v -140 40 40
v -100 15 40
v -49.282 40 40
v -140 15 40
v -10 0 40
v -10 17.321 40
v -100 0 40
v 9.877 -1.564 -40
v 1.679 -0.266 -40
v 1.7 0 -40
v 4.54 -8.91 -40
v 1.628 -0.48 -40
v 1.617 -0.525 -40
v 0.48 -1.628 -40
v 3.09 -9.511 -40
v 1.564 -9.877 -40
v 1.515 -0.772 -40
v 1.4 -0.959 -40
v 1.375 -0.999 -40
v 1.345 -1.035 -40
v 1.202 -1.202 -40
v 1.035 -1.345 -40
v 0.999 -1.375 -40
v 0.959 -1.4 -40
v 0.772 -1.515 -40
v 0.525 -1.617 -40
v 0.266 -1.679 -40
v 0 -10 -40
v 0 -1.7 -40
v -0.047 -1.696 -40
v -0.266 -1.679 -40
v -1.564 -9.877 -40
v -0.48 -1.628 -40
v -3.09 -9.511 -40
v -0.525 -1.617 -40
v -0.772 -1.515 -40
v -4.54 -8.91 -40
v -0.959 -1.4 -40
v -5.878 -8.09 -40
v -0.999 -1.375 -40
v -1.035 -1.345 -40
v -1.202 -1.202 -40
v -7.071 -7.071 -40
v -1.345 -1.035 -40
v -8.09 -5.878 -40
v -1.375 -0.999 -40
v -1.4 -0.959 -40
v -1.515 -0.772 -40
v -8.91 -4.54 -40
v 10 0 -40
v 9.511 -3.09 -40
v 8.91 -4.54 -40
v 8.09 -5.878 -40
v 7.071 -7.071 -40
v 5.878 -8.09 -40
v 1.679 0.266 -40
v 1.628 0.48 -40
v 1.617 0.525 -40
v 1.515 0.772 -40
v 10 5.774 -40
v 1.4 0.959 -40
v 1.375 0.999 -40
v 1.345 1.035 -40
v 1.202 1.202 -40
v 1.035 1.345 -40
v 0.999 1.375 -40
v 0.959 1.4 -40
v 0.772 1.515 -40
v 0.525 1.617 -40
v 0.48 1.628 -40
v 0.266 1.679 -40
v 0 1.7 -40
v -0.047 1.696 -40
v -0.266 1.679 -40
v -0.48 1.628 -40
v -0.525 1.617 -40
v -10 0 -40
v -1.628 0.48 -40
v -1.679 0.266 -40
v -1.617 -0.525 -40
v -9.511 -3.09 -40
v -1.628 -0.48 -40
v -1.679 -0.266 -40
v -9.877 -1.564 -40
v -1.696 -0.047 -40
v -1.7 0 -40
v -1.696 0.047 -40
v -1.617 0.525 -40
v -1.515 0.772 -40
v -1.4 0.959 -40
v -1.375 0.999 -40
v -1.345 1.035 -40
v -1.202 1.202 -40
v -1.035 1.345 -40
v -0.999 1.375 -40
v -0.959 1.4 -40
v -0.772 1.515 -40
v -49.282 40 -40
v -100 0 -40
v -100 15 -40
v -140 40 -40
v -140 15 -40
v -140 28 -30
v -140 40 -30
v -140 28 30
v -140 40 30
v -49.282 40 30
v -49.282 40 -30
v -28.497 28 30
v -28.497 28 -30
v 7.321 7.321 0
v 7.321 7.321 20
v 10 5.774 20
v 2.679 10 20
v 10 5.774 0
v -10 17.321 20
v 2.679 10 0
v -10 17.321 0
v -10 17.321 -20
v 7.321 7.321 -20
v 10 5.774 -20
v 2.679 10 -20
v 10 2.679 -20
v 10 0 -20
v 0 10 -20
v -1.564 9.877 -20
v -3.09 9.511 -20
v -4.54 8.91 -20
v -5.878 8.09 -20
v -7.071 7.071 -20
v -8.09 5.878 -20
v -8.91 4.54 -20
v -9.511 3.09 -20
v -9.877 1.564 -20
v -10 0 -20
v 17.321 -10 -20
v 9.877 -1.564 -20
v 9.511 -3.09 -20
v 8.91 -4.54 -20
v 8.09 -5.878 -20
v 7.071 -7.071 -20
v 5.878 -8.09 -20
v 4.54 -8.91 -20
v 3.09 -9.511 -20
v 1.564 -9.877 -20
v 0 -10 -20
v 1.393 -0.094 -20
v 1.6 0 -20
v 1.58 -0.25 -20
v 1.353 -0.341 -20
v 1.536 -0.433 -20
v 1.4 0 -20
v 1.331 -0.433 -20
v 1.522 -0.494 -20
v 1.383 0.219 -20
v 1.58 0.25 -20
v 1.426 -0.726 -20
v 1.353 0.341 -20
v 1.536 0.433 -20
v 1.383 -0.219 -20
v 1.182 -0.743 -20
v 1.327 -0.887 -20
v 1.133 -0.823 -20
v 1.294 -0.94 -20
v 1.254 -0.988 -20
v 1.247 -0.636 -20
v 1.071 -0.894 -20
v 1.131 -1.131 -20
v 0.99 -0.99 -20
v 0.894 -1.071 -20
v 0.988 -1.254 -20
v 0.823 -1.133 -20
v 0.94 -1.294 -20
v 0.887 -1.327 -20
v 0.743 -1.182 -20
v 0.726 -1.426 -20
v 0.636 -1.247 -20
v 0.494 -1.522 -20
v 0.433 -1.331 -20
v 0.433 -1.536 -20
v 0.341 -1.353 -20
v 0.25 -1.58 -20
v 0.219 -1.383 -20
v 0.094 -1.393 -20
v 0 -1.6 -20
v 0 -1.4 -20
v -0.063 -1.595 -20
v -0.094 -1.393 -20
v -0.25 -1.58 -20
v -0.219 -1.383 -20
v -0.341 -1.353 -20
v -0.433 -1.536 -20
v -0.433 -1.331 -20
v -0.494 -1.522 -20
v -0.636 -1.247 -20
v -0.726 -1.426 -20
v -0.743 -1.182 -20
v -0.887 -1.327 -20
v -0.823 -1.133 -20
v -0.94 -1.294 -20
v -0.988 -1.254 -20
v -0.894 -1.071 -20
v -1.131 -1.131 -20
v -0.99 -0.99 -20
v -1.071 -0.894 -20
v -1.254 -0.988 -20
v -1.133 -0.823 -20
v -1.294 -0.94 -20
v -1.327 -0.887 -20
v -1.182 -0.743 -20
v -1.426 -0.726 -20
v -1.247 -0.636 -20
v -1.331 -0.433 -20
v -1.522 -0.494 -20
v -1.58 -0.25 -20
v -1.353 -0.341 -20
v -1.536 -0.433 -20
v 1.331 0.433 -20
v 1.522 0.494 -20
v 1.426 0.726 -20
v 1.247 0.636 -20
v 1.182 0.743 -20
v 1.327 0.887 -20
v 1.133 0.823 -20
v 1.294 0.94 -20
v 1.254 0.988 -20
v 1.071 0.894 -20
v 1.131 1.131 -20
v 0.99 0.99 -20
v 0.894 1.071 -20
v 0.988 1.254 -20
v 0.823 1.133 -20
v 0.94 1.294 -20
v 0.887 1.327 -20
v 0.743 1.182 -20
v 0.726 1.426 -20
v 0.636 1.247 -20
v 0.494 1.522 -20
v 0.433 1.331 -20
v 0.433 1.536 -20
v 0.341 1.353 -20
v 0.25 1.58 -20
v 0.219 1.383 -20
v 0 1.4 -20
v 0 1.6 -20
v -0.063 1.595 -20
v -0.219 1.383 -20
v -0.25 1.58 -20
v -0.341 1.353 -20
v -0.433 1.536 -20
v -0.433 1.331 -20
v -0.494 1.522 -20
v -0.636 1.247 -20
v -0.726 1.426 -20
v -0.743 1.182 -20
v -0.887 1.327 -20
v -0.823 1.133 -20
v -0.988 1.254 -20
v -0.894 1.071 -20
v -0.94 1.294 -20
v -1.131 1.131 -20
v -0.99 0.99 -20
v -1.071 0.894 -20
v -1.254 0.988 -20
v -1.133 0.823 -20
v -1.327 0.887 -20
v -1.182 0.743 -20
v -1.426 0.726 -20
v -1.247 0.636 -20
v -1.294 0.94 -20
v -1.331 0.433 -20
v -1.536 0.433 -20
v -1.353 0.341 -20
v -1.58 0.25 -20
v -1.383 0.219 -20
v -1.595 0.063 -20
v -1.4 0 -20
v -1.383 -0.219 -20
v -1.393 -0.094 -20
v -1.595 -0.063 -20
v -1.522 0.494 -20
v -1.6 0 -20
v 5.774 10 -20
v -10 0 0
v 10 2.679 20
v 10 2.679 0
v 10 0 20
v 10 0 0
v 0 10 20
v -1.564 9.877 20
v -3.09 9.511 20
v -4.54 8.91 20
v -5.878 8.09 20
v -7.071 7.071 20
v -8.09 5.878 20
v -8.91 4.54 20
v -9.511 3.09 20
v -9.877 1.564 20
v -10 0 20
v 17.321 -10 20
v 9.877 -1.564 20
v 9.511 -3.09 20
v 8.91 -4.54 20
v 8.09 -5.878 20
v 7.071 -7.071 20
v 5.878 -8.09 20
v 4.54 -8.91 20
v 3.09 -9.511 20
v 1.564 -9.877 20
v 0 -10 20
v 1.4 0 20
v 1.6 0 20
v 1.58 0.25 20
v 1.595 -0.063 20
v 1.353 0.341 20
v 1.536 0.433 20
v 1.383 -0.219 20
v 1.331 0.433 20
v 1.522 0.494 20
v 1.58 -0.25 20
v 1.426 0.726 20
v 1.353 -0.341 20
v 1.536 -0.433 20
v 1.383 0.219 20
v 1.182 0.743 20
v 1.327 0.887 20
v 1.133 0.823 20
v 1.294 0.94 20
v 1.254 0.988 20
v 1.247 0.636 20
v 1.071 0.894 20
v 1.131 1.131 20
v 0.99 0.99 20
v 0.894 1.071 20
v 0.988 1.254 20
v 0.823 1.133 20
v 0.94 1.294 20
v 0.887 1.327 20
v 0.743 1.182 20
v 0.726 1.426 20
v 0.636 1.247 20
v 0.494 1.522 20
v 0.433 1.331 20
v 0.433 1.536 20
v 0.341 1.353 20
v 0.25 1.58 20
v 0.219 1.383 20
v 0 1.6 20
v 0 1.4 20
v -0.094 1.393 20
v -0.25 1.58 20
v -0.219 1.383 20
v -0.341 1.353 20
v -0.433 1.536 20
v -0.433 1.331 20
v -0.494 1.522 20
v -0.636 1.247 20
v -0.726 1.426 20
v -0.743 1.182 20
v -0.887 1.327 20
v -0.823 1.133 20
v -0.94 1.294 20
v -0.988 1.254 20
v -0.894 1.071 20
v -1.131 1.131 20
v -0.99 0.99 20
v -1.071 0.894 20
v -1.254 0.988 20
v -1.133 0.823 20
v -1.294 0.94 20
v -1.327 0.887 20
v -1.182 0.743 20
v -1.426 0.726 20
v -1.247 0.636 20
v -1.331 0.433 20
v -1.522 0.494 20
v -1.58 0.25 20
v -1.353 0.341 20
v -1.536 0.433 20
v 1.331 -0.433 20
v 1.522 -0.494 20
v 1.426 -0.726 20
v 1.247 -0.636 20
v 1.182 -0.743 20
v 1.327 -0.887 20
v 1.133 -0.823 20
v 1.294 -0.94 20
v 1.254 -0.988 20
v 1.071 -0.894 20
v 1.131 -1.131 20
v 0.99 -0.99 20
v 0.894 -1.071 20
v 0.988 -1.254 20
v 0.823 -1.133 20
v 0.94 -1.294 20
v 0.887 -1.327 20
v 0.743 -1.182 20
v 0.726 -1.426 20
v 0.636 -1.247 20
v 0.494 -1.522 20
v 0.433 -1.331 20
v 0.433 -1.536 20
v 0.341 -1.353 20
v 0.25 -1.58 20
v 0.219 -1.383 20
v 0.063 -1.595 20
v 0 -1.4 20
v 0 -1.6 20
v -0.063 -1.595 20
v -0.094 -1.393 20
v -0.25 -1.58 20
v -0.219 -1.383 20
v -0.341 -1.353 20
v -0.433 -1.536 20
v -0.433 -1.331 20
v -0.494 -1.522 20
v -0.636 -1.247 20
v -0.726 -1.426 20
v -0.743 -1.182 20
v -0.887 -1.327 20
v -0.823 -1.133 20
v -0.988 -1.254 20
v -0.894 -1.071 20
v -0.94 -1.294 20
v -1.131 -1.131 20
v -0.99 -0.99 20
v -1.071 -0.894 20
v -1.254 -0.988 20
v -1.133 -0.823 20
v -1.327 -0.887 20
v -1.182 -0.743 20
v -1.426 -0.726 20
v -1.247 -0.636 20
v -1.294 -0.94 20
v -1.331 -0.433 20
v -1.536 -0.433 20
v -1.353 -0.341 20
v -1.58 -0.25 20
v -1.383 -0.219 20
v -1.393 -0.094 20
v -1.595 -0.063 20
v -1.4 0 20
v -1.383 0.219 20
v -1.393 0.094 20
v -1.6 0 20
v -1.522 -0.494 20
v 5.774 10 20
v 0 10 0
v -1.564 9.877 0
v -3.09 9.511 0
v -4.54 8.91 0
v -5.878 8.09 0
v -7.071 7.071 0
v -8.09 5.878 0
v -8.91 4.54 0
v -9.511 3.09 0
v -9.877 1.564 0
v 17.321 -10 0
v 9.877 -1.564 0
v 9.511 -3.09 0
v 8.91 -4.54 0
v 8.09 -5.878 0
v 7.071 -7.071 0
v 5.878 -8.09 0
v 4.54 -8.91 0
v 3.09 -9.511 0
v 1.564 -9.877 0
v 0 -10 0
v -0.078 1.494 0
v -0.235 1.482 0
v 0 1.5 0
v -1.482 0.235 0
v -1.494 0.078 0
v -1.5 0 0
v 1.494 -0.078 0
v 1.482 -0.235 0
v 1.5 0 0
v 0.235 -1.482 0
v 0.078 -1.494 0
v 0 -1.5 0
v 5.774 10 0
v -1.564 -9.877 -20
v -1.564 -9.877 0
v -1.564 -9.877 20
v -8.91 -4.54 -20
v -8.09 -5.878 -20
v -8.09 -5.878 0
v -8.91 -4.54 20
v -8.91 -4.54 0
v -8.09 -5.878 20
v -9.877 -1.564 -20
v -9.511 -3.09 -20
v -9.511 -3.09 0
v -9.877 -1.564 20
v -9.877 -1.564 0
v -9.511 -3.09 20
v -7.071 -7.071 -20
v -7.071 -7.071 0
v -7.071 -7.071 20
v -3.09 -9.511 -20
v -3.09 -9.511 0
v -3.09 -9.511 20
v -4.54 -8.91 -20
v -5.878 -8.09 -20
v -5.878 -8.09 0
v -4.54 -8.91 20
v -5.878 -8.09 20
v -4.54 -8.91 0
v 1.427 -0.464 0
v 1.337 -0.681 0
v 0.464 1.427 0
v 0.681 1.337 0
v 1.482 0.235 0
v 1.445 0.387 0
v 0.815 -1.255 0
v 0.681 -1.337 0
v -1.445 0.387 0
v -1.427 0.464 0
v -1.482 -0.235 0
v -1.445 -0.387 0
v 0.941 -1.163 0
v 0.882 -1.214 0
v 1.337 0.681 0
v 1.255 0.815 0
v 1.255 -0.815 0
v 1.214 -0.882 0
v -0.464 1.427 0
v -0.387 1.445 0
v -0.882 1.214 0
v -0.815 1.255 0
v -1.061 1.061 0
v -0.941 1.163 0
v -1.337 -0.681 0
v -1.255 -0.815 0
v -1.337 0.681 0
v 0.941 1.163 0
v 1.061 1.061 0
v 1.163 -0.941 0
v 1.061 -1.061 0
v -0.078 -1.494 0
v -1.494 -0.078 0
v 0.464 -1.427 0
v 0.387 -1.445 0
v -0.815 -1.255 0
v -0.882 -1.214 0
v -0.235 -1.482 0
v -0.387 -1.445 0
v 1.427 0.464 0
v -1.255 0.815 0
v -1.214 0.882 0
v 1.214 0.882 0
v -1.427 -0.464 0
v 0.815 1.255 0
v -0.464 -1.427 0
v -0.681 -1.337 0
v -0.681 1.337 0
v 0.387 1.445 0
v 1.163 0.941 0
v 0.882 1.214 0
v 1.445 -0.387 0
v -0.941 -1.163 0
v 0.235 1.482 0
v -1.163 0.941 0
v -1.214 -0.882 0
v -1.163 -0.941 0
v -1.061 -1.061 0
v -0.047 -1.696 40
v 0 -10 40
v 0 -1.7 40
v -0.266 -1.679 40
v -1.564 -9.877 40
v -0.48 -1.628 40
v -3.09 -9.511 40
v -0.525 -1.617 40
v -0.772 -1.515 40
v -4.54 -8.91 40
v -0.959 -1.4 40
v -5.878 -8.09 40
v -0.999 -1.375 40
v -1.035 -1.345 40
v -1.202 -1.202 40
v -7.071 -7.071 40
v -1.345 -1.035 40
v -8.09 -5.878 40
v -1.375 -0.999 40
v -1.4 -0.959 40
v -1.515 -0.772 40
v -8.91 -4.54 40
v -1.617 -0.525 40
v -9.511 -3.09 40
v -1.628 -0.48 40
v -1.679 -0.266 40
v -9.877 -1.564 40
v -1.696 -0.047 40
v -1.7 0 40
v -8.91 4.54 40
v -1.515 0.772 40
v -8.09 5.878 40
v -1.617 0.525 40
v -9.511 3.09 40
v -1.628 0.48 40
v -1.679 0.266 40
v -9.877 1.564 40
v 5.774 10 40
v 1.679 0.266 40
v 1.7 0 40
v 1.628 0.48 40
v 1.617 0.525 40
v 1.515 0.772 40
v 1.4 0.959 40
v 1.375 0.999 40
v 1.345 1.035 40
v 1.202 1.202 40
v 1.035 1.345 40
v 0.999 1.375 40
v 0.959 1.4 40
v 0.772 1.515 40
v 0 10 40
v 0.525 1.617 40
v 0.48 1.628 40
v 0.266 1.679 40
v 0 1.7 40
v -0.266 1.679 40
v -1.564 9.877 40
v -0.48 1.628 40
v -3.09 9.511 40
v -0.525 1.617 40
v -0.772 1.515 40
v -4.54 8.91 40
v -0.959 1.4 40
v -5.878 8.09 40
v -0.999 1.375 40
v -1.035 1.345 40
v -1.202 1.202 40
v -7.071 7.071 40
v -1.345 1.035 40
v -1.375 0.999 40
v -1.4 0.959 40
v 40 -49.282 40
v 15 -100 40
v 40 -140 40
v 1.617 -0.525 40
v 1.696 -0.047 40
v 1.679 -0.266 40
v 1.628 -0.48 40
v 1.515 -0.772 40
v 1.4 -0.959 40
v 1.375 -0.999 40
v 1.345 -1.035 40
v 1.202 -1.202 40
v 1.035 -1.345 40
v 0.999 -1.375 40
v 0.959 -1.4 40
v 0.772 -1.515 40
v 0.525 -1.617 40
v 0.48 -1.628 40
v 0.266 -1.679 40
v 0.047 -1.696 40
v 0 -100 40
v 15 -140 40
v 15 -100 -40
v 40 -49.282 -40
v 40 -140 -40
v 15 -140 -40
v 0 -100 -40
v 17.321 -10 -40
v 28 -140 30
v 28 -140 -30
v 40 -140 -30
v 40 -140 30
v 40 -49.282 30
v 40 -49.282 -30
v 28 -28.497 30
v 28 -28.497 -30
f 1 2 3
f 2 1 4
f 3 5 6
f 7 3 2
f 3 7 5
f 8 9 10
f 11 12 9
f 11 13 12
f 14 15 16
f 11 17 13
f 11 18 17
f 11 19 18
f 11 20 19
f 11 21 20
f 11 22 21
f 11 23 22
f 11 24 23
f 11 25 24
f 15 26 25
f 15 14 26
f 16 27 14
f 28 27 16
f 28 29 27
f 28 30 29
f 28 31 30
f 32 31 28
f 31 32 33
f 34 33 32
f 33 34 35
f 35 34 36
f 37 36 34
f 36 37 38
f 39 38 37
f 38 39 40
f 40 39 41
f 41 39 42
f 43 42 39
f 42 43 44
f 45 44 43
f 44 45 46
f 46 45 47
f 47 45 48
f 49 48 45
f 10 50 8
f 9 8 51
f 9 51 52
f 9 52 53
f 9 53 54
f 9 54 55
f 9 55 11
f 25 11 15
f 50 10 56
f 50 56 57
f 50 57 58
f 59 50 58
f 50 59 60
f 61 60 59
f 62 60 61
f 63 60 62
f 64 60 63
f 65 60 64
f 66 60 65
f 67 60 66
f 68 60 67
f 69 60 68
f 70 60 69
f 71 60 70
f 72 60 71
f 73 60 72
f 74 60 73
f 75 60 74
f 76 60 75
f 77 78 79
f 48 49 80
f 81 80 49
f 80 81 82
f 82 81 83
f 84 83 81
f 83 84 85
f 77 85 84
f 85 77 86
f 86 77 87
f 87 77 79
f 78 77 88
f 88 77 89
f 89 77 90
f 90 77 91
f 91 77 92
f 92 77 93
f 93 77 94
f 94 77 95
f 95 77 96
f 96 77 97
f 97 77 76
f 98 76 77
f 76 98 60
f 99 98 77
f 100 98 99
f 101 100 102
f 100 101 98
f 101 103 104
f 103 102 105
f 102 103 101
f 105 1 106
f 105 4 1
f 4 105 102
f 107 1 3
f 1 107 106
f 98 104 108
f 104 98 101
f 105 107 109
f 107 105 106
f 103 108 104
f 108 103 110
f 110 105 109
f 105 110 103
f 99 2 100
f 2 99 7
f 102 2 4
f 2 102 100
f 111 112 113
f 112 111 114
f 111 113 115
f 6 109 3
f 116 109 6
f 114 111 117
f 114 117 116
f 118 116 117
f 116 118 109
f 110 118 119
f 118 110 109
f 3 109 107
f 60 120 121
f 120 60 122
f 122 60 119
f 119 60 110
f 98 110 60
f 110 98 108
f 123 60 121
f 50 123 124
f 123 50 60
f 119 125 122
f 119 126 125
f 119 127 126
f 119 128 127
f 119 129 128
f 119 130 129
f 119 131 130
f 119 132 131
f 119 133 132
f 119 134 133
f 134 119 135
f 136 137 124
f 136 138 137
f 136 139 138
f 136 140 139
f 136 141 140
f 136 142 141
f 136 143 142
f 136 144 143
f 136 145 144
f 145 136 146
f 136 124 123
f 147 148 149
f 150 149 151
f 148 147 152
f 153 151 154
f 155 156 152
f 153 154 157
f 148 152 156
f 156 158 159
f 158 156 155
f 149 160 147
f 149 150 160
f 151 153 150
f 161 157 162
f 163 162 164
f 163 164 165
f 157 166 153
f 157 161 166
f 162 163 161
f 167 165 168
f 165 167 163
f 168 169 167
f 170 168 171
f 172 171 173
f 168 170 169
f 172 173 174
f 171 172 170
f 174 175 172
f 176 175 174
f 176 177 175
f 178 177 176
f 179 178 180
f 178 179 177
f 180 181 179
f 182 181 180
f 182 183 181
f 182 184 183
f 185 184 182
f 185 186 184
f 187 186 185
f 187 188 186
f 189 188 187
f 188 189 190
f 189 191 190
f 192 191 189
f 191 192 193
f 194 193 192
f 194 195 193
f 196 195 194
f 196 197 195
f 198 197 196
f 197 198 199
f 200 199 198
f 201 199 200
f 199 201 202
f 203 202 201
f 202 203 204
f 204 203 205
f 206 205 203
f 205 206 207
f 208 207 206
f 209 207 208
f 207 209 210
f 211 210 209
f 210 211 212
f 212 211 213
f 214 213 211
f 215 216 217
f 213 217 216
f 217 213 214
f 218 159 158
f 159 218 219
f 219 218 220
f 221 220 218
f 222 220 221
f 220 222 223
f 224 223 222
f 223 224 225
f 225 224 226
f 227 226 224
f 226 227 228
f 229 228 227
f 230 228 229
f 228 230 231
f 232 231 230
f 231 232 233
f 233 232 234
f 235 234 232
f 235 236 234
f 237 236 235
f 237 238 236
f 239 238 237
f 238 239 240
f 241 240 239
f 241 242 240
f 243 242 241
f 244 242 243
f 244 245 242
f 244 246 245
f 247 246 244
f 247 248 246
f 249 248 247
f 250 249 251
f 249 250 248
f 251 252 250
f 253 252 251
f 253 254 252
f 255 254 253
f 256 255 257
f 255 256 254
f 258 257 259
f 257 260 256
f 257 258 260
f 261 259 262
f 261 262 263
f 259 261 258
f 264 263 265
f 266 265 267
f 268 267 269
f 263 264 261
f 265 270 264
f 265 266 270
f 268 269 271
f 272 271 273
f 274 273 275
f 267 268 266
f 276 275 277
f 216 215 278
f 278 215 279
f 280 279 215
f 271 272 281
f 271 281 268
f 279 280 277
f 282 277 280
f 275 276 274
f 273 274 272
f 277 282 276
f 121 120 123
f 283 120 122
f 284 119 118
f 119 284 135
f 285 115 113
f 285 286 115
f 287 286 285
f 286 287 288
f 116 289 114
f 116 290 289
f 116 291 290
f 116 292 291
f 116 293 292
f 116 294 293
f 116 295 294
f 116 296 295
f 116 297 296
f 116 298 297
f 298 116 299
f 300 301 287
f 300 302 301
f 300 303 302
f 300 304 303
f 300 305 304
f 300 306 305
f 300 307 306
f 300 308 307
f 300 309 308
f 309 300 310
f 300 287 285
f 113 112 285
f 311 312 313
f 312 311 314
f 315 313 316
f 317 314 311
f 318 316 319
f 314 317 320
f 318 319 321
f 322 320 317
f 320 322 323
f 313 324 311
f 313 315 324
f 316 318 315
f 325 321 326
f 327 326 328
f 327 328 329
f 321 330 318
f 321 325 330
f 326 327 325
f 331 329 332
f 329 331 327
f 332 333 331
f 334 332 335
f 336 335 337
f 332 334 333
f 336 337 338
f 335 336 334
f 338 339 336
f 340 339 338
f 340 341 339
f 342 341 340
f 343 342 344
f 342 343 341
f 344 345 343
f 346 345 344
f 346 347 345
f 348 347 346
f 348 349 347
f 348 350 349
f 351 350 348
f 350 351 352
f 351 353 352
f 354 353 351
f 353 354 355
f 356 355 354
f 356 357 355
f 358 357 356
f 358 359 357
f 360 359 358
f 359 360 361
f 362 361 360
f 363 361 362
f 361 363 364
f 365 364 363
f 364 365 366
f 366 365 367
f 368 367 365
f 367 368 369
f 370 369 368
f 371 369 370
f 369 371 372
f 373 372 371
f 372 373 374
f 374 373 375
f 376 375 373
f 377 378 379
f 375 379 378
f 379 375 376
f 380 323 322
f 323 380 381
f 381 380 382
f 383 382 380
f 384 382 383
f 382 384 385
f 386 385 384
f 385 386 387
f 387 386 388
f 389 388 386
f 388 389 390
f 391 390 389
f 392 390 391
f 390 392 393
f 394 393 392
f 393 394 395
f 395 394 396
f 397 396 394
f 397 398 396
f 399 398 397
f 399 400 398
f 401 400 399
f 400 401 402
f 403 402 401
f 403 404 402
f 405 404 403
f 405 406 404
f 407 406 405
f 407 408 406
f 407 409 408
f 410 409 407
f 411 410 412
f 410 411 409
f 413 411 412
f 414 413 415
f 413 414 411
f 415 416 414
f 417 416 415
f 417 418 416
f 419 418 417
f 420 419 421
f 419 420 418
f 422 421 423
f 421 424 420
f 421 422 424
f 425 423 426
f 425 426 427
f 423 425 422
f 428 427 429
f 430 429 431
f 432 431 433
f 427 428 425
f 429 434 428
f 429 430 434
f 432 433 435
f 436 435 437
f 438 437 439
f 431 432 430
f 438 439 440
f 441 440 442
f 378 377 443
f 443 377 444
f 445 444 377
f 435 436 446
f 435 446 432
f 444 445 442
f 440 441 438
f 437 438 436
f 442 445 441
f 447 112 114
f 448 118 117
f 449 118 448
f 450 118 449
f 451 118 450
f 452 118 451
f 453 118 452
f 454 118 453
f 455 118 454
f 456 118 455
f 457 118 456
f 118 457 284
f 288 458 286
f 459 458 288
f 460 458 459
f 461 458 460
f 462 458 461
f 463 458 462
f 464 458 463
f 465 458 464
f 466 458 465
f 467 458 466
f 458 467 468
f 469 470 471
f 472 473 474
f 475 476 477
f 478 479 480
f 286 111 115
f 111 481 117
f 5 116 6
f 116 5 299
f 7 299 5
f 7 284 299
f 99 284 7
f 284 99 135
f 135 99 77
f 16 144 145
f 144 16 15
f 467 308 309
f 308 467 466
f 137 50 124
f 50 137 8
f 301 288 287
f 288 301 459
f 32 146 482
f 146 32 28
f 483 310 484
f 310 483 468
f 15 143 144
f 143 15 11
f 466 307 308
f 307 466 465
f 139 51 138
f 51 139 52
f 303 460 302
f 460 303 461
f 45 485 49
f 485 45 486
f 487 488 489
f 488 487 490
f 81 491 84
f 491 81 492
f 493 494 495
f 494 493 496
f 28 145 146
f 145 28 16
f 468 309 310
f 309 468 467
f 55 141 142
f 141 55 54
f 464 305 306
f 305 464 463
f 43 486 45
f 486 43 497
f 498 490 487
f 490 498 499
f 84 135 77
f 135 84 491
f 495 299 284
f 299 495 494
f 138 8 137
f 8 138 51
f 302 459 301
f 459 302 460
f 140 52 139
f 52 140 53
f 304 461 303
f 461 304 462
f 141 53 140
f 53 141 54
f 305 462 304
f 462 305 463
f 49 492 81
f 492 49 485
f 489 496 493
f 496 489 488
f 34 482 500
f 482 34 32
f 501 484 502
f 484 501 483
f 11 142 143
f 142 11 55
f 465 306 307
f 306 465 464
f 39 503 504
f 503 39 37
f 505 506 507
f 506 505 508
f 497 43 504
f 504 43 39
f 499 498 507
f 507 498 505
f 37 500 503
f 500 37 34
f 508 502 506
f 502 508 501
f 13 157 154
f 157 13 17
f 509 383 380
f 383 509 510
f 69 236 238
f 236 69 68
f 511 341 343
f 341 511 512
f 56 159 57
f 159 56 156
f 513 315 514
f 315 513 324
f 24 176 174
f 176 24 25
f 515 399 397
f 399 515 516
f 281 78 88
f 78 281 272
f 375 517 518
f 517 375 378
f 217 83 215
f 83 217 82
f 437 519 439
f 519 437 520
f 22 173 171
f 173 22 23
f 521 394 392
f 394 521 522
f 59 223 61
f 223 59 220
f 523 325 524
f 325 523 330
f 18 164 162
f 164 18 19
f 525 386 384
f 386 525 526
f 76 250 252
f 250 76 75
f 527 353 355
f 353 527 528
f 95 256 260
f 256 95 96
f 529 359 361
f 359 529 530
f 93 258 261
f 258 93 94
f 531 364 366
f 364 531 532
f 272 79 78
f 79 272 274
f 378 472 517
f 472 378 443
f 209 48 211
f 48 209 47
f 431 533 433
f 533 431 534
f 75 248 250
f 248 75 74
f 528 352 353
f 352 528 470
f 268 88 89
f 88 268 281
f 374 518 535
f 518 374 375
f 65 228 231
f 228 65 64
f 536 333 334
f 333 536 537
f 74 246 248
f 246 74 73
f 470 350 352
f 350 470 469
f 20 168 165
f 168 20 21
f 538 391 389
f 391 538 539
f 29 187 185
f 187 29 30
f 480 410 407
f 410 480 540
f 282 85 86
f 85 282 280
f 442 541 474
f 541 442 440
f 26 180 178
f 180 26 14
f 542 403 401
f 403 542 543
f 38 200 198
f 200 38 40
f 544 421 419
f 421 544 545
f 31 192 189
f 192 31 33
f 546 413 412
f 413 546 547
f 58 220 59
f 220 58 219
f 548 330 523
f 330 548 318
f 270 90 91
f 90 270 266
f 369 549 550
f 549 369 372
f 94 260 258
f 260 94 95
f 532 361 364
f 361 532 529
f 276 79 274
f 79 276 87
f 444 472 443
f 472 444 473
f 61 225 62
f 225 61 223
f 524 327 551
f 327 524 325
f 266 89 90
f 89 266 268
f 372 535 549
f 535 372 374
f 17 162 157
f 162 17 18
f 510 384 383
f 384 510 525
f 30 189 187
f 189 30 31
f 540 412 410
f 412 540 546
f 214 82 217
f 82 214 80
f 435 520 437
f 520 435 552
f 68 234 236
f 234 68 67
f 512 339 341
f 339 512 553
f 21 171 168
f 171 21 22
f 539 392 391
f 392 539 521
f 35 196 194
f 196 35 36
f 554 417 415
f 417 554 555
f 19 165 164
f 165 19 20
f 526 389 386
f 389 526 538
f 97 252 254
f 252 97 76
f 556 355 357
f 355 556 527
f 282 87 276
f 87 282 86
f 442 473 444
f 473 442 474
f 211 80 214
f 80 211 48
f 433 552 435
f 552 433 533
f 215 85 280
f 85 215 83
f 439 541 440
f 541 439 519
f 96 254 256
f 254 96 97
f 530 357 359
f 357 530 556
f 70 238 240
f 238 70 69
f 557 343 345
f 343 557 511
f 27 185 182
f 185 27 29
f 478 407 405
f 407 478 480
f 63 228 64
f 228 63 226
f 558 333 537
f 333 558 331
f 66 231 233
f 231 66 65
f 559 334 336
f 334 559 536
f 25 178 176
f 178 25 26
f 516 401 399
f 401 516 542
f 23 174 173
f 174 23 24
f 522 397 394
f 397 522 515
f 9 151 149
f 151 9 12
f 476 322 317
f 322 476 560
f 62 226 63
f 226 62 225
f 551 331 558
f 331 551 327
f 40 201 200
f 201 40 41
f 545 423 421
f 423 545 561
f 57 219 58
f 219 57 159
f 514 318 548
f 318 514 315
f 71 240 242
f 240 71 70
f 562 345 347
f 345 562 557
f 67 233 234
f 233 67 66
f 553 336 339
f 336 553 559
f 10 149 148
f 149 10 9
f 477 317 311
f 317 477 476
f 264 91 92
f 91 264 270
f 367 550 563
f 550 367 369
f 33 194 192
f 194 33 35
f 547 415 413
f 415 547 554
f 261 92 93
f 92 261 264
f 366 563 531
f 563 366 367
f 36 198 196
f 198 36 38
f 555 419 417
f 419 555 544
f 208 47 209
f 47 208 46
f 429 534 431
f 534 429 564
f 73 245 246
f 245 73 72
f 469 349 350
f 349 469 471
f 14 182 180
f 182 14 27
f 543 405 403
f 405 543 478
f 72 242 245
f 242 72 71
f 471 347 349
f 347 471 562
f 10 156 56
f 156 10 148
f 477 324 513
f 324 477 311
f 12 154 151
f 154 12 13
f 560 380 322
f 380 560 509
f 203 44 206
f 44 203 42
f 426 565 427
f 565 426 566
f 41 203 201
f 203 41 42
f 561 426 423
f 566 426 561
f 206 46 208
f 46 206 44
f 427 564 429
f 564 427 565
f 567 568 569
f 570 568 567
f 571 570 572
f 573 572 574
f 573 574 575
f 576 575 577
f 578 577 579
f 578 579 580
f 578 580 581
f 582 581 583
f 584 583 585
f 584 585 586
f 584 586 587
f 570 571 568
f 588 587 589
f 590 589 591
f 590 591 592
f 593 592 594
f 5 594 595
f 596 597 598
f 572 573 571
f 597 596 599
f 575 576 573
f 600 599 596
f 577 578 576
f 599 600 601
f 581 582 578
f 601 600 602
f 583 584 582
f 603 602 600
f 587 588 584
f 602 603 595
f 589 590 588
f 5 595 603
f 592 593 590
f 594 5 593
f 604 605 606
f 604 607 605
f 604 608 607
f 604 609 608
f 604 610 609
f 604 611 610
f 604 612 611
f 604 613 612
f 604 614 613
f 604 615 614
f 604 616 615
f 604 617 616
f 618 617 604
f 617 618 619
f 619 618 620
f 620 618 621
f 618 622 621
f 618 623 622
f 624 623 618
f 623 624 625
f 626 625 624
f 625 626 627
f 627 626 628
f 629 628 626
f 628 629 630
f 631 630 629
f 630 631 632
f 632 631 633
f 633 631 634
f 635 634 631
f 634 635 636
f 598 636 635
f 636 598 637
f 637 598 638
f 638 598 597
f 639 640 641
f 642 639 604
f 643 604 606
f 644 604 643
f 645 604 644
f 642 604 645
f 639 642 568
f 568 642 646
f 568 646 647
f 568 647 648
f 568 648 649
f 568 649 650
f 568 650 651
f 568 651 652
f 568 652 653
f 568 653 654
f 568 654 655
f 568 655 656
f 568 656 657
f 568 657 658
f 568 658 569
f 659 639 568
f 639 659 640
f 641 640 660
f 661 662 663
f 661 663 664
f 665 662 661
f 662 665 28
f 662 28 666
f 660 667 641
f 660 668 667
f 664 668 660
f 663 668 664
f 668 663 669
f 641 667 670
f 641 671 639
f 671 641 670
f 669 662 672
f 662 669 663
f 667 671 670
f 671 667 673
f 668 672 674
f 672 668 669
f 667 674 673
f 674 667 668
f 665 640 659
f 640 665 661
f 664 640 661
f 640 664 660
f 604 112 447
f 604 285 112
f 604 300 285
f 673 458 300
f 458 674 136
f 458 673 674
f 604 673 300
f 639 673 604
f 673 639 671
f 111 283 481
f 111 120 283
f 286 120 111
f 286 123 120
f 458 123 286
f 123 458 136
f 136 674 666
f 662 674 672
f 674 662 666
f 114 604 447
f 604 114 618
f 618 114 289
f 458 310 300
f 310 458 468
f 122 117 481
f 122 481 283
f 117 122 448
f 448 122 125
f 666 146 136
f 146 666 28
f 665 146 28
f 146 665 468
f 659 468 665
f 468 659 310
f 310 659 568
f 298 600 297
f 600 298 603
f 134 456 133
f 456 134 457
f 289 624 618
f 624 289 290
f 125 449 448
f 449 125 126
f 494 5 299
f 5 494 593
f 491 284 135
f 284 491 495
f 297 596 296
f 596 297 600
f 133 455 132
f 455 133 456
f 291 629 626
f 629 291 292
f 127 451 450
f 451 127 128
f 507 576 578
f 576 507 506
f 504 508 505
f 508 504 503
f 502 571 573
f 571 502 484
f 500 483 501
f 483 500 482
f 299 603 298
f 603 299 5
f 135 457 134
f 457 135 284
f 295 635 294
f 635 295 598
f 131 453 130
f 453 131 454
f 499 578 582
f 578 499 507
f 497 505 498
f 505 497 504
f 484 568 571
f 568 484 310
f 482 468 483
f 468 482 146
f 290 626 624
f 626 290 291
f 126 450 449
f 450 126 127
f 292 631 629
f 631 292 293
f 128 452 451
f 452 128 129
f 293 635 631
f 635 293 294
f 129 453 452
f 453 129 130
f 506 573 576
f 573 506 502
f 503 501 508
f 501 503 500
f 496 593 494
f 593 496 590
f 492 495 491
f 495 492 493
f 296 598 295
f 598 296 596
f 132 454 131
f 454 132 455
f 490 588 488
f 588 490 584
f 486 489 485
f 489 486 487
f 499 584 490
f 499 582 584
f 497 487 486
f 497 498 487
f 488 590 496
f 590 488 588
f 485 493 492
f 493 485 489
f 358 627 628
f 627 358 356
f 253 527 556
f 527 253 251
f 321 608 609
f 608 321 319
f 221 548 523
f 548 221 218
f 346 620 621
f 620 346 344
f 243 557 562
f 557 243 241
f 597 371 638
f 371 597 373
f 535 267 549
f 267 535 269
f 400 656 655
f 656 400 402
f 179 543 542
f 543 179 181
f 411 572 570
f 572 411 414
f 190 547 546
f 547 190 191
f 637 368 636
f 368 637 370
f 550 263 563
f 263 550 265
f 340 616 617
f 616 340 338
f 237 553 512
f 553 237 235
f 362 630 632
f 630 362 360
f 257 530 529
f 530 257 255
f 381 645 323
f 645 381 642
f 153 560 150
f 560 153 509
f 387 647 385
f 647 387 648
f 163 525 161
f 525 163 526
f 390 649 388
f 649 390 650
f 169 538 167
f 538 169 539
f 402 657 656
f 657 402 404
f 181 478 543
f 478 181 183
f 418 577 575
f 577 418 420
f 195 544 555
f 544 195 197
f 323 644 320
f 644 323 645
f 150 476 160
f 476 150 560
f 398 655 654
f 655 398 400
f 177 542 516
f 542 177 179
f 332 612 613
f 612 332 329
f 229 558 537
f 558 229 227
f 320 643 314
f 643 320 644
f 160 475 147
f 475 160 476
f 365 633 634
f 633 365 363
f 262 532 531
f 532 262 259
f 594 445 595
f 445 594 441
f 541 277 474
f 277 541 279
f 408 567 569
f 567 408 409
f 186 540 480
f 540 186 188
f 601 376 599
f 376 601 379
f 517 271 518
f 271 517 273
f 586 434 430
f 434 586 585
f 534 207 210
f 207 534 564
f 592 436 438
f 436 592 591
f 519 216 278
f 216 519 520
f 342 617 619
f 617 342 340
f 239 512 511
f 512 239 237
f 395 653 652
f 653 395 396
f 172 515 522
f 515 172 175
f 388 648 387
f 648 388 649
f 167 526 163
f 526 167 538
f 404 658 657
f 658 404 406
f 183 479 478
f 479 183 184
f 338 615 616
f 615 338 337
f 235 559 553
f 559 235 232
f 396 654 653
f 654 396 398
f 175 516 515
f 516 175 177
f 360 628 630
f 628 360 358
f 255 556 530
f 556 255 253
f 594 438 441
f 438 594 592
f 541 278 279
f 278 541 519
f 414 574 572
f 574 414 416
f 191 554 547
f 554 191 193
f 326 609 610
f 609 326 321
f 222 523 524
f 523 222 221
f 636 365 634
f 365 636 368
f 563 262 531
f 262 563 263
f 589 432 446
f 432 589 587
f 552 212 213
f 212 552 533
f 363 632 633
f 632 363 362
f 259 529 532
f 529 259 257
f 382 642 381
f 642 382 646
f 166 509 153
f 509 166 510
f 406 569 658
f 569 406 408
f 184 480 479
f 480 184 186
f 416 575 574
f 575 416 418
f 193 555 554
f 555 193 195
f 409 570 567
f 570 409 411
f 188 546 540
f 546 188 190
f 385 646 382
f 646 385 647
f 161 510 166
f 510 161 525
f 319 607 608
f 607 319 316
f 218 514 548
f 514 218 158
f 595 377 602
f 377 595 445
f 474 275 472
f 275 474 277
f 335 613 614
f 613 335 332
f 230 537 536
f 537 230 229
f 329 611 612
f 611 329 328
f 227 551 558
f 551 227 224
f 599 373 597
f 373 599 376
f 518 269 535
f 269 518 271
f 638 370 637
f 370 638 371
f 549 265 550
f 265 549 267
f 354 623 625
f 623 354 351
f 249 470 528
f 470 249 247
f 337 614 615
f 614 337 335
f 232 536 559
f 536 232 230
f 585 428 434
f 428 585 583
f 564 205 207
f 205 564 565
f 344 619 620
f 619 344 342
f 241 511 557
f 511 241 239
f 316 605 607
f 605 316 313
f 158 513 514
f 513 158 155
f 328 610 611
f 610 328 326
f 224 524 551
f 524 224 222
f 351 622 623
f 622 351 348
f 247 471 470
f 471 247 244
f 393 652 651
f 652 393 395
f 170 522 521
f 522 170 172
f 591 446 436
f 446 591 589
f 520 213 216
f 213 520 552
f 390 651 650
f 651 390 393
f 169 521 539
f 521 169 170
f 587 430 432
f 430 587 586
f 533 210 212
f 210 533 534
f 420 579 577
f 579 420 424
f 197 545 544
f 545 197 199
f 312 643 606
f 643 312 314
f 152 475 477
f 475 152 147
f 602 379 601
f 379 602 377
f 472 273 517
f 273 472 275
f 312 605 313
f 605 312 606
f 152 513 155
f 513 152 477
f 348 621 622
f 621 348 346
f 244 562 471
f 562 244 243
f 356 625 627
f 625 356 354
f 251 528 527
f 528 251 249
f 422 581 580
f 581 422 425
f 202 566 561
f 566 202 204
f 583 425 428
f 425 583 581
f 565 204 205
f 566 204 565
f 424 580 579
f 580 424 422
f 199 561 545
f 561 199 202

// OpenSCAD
$fn = 40;

module moule(){
    difference(){
        translate([-20,0,0]) cube([160,80,80],center=true);
        translate([-20,68,0]) cube([200,80,60],center=true);
        translate([-20,-68,0]) cube([200,80,60],center=true);
        translate([-110,0,0]) cube([100,30,100],center=true);
        rotate([0,0,-30]) translate([0,45,0]) cube([100,30,100],center=true);
        rotate([0,0,30]) translate([0,-45,0]) cube([100,30,100],center=true);
    }
}

module masqueGauche(){
    difference(){
        translate([-80,0,0]) union(){
            translate([-100,-100,-50]) cube([200,200,30]);
            translate([-120,-10,-21]) cube([200,200,22]);
            translate([-100,-100,0]) cube([200,200,20]);
            translate([-120,-10,20]) cube([200,200,32]);
        }
        difference(){
            translate([-160,-200,-100]) cube([200,200,200]);
                translate([10,0,-50]) cylinder(h=100,r=10);
        }
        translate([10,0,-100]) cylinder(200,2);
    }
}
module masqueDroit(){
        rotate([180,0,0]) masqueGauche();
}
module mouleExcave(){
    difference(){
        translate([-30,0,0]) moule();
    }
}
module morceauGauche(){
    intersection(){
        mouleExcave();
        masqueGauche();
    }
}
module morceauDroit(){
    intersection(){
        mouleExcave();
        masqueDroit();
    }
}
translate([-10,-0,0]) morceauGauche();
rotate([0,0,90]) color("red") translate([-10,-0,0]) morceauDroit();
